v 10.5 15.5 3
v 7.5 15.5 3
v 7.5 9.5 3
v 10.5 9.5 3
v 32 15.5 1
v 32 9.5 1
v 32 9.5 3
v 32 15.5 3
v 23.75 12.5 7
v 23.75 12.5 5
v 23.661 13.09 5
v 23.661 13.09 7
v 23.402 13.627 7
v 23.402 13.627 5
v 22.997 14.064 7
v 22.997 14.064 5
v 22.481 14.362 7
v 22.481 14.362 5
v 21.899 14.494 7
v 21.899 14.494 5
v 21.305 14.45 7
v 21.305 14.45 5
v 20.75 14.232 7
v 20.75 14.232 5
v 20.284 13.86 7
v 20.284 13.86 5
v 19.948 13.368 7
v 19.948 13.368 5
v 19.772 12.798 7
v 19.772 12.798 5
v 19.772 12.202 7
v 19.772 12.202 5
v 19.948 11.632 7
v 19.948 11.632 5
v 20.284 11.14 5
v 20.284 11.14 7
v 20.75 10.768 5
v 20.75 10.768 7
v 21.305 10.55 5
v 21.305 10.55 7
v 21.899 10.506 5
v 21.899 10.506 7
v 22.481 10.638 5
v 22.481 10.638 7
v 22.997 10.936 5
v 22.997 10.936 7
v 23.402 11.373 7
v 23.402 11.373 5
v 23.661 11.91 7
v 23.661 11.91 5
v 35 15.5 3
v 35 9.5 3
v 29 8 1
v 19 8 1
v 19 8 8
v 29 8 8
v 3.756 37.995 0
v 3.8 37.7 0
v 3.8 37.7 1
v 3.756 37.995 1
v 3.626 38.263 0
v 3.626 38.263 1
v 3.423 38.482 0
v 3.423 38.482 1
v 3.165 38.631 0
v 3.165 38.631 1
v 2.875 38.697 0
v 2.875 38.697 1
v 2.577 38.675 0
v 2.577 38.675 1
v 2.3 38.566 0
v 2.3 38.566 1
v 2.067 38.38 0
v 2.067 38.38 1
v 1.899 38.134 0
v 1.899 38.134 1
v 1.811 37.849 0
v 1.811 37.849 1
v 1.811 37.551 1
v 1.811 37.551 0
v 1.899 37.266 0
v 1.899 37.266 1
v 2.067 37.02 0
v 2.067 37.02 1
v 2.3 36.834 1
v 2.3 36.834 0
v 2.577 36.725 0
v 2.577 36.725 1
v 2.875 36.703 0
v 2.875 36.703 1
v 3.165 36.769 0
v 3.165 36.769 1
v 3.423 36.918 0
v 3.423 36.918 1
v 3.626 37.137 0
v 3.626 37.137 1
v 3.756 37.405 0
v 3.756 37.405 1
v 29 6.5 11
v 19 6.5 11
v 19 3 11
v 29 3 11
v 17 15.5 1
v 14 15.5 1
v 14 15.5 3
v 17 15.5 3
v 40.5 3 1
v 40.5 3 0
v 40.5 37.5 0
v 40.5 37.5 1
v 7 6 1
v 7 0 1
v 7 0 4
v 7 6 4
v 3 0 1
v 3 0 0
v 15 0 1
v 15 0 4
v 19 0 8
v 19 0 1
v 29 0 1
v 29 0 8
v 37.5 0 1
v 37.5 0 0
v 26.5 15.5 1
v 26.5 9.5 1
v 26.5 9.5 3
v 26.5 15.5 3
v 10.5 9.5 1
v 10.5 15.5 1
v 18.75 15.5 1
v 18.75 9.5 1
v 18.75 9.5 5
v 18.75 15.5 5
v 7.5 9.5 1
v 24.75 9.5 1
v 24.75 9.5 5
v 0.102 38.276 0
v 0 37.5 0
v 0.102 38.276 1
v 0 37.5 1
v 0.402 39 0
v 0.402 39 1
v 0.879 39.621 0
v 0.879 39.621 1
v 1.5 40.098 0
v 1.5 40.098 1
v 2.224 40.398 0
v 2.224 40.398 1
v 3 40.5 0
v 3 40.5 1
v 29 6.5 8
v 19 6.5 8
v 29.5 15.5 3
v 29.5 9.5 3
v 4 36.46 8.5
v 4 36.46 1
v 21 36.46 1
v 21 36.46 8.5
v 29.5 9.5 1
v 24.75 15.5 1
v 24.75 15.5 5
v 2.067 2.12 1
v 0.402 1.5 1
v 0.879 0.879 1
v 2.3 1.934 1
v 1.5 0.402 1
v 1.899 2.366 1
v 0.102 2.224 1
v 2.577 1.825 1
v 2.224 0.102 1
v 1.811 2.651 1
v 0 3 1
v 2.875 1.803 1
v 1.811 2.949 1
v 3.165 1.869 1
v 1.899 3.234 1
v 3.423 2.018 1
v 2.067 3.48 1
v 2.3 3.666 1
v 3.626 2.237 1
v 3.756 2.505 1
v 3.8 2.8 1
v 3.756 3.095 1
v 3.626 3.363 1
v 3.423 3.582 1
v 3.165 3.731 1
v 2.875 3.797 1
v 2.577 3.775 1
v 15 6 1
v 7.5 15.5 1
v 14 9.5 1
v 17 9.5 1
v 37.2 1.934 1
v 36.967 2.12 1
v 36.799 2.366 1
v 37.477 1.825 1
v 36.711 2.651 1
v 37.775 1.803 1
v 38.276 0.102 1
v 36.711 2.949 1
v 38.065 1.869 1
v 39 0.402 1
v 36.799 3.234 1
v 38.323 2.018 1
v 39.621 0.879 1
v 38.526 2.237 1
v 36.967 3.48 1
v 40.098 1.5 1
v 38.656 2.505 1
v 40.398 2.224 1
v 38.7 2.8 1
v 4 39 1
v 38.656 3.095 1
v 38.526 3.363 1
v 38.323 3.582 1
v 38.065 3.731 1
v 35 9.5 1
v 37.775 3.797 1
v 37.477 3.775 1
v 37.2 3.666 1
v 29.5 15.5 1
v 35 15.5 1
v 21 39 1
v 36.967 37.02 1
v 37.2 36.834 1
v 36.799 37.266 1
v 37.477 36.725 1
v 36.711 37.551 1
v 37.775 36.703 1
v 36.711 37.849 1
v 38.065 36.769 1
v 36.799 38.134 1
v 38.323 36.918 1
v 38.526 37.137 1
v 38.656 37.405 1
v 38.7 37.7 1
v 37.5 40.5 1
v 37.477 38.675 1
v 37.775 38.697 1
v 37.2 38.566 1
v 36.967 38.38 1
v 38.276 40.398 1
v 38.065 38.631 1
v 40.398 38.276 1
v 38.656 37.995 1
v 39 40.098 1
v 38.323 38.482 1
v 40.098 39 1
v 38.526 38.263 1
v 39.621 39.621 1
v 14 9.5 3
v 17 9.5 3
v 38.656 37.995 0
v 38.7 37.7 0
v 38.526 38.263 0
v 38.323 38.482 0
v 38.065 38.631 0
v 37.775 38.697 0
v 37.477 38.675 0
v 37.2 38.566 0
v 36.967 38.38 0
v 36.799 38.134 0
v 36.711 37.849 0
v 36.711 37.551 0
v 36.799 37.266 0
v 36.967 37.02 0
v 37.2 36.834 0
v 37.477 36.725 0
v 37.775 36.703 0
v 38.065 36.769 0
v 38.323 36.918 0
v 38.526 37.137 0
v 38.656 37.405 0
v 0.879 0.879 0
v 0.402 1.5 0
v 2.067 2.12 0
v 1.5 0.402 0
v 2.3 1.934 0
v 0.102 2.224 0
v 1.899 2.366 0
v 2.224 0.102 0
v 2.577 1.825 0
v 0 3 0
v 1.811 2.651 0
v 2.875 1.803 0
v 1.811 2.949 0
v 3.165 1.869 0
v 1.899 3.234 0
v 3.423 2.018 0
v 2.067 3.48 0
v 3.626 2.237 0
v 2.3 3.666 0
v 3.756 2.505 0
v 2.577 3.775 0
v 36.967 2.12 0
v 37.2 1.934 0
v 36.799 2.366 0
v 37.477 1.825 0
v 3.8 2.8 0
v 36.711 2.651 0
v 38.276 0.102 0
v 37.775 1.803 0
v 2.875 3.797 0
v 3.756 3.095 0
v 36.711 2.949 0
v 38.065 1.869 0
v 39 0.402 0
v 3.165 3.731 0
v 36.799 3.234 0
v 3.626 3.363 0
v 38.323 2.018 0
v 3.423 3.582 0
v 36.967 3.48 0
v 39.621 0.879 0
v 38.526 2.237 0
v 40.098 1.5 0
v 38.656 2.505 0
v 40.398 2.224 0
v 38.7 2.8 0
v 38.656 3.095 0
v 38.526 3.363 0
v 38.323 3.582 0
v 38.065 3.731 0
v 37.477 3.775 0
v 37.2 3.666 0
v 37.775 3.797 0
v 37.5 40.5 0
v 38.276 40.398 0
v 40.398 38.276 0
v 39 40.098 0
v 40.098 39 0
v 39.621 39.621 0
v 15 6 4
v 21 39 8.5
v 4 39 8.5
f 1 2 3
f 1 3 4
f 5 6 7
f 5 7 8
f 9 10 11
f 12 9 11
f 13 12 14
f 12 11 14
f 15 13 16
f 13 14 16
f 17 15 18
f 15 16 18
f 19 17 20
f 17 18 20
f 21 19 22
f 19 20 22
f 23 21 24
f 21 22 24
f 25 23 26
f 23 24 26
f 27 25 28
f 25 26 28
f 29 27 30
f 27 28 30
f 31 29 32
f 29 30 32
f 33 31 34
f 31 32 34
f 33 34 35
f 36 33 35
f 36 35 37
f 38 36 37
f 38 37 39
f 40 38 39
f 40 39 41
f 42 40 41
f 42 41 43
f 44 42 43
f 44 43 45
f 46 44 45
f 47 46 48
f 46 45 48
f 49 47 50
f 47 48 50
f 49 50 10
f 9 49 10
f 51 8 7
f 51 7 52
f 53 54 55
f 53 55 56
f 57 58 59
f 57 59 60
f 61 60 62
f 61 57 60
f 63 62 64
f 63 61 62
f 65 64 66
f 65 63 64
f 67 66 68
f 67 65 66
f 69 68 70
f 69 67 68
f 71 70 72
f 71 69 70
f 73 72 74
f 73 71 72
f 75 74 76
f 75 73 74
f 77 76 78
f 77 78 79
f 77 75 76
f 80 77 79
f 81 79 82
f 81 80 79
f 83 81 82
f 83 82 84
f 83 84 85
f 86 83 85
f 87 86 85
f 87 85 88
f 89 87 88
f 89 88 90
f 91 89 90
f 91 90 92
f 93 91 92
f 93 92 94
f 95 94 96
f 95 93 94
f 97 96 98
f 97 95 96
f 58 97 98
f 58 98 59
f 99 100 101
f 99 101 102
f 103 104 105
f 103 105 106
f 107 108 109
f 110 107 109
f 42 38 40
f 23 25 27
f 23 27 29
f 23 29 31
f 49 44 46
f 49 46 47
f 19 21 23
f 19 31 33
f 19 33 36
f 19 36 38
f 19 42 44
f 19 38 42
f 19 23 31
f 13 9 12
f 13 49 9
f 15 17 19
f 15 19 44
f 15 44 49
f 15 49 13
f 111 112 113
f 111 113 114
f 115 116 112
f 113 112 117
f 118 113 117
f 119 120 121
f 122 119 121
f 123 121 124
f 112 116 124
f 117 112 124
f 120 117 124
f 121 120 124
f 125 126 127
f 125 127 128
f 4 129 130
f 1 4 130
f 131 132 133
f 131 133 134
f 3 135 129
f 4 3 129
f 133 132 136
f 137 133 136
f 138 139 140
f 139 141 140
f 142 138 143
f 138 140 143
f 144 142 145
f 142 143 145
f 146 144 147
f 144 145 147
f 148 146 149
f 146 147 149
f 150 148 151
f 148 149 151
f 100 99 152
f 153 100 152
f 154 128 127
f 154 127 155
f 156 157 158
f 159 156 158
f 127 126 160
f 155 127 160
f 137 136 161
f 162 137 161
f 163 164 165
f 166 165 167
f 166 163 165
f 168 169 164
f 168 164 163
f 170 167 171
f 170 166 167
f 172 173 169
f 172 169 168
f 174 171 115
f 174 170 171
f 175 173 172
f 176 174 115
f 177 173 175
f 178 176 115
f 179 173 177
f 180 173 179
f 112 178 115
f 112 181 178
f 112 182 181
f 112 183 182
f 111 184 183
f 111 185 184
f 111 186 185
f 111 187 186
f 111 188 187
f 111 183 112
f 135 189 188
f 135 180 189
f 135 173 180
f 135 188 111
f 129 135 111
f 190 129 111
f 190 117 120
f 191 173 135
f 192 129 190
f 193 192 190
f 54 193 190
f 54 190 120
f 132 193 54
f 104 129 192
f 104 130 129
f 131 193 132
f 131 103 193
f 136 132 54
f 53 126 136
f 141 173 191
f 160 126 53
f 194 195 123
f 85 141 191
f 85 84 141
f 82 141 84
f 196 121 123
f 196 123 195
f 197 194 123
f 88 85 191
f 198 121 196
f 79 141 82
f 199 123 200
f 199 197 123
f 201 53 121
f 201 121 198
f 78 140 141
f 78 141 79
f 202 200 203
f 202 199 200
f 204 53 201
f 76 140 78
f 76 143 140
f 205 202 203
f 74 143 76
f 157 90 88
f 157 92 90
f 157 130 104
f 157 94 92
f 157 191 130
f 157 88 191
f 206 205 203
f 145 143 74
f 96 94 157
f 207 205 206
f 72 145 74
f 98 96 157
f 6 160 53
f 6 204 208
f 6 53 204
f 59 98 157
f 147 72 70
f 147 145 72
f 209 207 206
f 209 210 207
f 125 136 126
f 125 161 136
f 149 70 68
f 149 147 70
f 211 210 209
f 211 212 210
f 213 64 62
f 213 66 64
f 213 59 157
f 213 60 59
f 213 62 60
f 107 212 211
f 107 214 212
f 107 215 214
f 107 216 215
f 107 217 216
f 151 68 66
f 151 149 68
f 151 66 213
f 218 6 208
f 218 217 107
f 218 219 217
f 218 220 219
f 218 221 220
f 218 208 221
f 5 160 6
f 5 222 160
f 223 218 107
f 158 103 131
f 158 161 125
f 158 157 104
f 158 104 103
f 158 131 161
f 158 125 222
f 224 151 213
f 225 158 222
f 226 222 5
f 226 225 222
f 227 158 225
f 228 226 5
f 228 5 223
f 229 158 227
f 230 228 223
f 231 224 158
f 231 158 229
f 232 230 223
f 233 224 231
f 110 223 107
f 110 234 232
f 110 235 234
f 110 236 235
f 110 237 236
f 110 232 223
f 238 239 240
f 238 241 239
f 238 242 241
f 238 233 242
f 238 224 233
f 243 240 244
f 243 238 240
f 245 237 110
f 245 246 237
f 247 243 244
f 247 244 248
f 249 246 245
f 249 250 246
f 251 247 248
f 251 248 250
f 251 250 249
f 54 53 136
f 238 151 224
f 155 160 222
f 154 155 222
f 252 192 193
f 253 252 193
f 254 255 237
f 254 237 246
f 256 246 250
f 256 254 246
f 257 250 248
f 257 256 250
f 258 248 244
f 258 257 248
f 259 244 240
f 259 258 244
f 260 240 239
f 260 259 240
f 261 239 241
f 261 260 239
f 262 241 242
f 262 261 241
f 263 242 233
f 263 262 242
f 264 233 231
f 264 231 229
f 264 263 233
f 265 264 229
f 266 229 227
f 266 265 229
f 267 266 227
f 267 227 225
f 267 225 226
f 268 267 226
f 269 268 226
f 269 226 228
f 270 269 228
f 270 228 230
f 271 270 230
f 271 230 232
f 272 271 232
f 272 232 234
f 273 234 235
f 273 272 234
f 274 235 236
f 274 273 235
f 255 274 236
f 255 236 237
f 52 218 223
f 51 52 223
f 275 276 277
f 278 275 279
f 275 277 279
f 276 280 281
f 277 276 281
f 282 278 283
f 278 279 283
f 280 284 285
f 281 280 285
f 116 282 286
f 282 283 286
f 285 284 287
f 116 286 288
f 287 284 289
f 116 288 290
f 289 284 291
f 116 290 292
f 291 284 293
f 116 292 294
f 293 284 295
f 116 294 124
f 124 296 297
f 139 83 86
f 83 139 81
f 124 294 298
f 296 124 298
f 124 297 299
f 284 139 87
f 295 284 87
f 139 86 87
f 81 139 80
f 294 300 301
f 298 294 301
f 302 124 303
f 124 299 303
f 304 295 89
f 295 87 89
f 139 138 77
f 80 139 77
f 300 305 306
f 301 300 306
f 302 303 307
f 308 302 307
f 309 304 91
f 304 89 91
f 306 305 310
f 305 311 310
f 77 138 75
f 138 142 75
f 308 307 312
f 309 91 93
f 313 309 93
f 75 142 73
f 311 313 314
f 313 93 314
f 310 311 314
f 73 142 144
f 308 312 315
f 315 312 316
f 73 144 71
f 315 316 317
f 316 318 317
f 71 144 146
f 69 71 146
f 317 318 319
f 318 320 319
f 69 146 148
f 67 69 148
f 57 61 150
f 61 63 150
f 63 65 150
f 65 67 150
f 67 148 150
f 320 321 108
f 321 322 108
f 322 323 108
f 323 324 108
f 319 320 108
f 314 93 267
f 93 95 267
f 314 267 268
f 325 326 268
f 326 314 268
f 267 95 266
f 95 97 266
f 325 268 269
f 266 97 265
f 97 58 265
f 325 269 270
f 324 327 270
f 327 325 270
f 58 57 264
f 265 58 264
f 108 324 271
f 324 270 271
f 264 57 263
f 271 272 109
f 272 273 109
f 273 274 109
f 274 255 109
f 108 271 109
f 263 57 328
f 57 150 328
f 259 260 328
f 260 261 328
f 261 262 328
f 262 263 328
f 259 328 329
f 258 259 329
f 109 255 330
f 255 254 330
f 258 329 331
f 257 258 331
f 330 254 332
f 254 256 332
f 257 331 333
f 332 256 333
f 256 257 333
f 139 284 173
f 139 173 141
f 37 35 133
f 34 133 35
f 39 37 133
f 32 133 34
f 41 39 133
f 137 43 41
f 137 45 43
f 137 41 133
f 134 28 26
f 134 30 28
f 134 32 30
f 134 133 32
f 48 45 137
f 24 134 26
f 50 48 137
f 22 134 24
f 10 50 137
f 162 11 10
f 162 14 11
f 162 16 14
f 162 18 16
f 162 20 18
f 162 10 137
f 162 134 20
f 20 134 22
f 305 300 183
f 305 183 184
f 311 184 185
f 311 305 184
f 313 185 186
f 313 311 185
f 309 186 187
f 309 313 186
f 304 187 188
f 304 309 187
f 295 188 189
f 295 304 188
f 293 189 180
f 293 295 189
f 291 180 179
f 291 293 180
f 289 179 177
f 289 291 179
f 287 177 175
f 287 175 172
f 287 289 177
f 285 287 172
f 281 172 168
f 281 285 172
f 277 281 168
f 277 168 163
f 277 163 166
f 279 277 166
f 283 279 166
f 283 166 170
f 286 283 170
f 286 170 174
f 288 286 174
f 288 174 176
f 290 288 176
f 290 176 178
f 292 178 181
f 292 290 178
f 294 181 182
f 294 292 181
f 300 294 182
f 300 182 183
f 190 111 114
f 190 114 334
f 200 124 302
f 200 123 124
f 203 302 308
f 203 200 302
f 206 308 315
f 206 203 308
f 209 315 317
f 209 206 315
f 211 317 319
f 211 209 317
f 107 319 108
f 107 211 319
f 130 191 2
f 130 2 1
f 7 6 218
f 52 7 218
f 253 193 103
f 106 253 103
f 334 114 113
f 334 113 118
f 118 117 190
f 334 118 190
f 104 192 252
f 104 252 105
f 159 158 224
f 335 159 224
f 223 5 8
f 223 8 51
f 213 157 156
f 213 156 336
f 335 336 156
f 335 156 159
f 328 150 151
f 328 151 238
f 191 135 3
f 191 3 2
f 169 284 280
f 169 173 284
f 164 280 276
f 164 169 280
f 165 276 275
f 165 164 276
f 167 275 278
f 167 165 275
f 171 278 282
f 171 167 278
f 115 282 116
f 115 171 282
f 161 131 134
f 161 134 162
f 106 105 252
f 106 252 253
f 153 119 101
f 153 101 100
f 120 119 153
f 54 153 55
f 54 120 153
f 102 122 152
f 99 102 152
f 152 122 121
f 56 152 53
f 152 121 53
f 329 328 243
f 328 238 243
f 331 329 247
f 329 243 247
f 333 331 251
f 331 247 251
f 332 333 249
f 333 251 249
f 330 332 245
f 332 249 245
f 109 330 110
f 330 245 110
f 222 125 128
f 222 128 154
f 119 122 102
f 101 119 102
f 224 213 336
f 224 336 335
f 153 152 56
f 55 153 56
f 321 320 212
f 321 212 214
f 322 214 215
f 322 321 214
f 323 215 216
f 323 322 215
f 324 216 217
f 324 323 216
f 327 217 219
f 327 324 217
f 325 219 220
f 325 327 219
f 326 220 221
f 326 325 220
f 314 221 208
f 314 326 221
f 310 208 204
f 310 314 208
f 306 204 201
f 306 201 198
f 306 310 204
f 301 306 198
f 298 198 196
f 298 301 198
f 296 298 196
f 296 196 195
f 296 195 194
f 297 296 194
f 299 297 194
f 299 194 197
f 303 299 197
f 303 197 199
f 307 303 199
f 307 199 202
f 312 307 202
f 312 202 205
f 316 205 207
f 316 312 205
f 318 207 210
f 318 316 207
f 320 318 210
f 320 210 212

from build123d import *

# Parameters (mm, degrees)
ESQUISSE1_W             = 40.5
ESQUISSE1_H             = 40.5
ESQUISSE1_R             = 1
BOSS_EXTRU_1_DEPTH      = 1
CONG_1_R                = 3
ESQUISSE2_W             = 10
ESQUISSE2_H             = 8
BOSS_EXTRU_2_DEPTH      = 10
ESQUISSE3_W             = 3
ESQUISSE3_H             = 1.5
ENL_V_MAT_EXTRU_1_DEPTH = 10
ESQUISSE4_W             = 8
ESQUISSE4_H             = 6
BOSS_EXTRU_3_DEPTH      = 3
ESQUISSE5_W             = 3
ESQUISSE5_H             = 6
BOSS_EXTRU_4_DEPTH      = 2
ESQUISSE6_W             = 6
ESQUISSE6_H             = 6
BOSS_EXTRU_5_DEPTH      = 4
ESQUISSE7_R             = 2
BOSS_EXTRU_6_DEPTH      = 2
ESQUISSE8_W             = 17
ESQUISSE8_H             = 2.54
BOSS_EXTRU_7_DEPTH      = 7.5


with BuildPart() as part:
    # Esquisse1 → Boss.-Extru.1 (new body)
    with BuildSketch(Plane.XY):
        with Locations((20.25, 20.25)):
            Rectangle(ESQUISSE1_W, ESQUISSE1_H)
        with Locations((37.7, 37.7)):
            Circle(ESQUISSE1_R, mode=Mode.SUBTRACT)
        with Locations((37.7, 2.8)):
            Circle(ESQUISSE1_R, mode=Mode.SUBTRACT)
        with Locations((2.8, 2.8)):
            Circle(ESQUISSE1_R, mode=Mode.SUBTRACT)
        with Locations((2.8, 37.7)):
            Circle(ESQUISSE1_R, mode=Mode.SUBTRACT)
    extrude(amount=BOSS_EXTRU_1_DEPTH)

    # Congé1
    cong_1_edges = [part.edges().sort_by_distance(p)[0] for p in [
        (0, 40.5, 0.5),
        (40.5, 40.5, 0.5),
        (40.5, 0, 0.5),
        (0, 0, 0.5),
    ]]
    fillet(cong_1_edges, radius=CONG_1_R)

    # Esquisse2 → Boss.-Extru.2 (add)
    with BuildSketch(Plane.XY.offset(1)):
        with Locations((24, 4)):
            Rectangle(ESQUISSE2_W, ESQUISSE2_H)
    extrude(amount=BOSS_EXTRU_2_DEPTH)

    # Esquisse3 → Enlèv. mat.-Extru.1 (cut)
    with BuildSketch(Plane(origin=(29, 0, 0), x_dir=(0, 0, -1), z_dir=(1, 0, 0))):
        Polygon((-8, 0), (-11, 3), (-11, 0), align=None)
        with Locations((-9.5, 7.25)):
            Rectangle(ESQUISSE3_W, ESQUISSE3_H)
    extrude(amount=-ENL_V_MAT_EXTRU_1_DEPTH, mode=Mode.SUBTRACT)

    # Esquisse4 → Boss.-Extru.3 (add)
    with BuildSketch(Plane.XY.offset(1)):
        with Locations((11, 3)):
            Rectangle(ESQUISSE4_W, ESQUISSE4_H)
    extrude(amount=BOSS_EXTRU_3_DEPTH)

    # Esquisse5 → Boss.-Extru.4 (add)
    with BuildSketch(Plane.XY.offset(1)):
        with Locations((9, 12.5)):
            Rectangle(ESQUISSE5_W, ESQUISSE5_H)
        with Locations((15.5, 12.5)):
            Rectangle(ESQUISSE5_W, ESQUISSE5_H)
        with Locations((28, 12.5)):
            Rectangle(ESQUISSE5_W, ESQUISSE5_H)
        with Locations((33.5, 12.5)):
            Rectangle(ESQUISSE5_W, ESQUISSE5_H)
    extrude(amount=BOSS_EXTRU_4_DEPTH)

    # Esquisse6 → Boss.-Extru.5 (add)
    with BuildSketch(Plane.XY.offset(1)):
        with Locations((21.75, 12.5)):
            Rectangle(ESQUISSE6_W, ESQUISSE6_H)
    extrude(amount=BOSS_EXTRU_5_DEPTH)

    # Esquisse7 → Boss.-Extru.6 (add)
    with BuildSketch(Plane.XY.offset(5)):
        with Locations((21.75, 12.5)):
            Circle(ESQUISSE7_R)
    extrude(amount=BOSS_EXTRU_6_DEPTH)

    # Esquisse8 → Boss.-Extru.7 (add)
    with BuildSketch(Plane.XY.offset(1)):
        with Locations((12.5, 37.73)):
            Rectangle(ESQUISSE8_W, ESQUISSE8_H)
    extrude(amount=BOSS_EXTRU_7_DEPTH)


solid = part.part
